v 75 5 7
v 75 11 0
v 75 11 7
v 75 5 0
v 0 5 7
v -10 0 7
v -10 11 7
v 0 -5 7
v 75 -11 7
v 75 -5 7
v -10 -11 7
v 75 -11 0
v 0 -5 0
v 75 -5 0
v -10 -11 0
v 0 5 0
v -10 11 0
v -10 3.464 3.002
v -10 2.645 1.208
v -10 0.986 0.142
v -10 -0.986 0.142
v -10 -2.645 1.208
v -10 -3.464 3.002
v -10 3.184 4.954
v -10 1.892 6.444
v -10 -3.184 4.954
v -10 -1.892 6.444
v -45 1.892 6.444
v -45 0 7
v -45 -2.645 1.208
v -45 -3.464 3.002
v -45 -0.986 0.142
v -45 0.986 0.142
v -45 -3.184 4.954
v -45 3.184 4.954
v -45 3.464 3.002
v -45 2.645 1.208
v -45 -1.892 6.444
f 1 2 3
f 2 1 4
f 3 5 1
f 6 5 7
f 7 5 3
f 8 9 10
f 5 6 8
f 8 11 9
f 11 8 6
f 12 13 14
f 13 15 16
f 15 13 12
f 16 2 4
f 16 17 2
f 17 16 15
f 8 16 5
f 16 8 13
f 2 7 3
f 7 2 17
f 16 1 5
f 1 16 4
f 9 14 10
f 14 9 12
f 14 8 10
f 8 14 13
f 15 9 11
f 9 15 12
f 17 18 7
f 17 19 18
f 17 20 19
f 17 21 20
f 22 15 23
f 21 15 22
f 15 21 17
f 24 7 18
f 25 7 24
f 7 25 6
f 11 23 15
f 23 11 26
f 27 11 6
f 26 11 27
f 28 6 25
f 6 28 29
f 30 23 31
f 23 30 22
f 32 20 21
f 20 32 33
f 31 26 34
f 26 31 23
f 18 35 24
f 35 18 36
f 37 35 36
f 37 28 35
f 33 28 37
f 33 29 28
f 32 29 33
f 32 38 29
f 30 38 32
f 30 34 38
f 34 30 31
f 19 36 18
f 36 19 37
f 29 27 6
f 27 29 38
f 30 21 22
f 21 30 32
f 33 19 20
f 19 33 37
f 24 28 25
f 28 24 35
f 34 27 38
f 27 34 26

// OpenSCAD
include <MCAD/units.scad>

PLA=0;
ABS=1;
ALU=2;
STEEL_A216=3;

properties=[ // E, rho in SI units
    [3.5E9, 1.3e3],
    [2.0E9, 1.1e3],
    [68E9, 2.790e3],
    [190E9, 7.8e3]
];

RECT=1;   // [+/-1, [b,h], pos]
CIRCLE=2; // [+/-2, dia, pos]

function area_1(area) =
    let(type = abs(area[0]))
    let(size = area[1])
    type == RECT ? size[0]*size[1] :
    type == CIRCLE ? PI*pow((size/2),2) :
    undef;

function I_1(area) =
    let(type = abs(area[0]))
    let(sig = type > 0 ? 1 : -1)
    let(size = area[1])
    type == RECT ? [size[0]*pow(size[1],3)/12, pow(size[0],3)*size[1]/12] :
    type == CIRCLE ? [PI/4*pow(size/2,4), PI/4*pow(size/2,4)] :
    undef;

function centroid(areas, i=0, sp=[0,0], sA=0) =
    i >= len(areas) ? sp/sA :
    let(area = areas[i])
    let(pos = area[2])
    let(A = area_1(area))
    centroid(areas, i+1, sp+A*pos, sA+A);

function I(areas, i=0, I_=[0,0], C_) =
    i >= len(areas) ? I_ :
    let(C = i==0 ? centroid(areas) : C_)
    let(area = areas[i])
    let(type = abs(area[0]))
    let(sig = area[0]>0 ? 1 : -1)
    let(size = area[1])
    let(A = area_1(area))
    let(pos = area[2] - C) // centroid-relative
    let(Ioffs = [A*pos[1]*pos[1], A*pos[0]*pos[0]])
    I(areas, i+1, I_ + sig*(I_1([area[0], size]) + Ioffs), C);

function area(areas, i=0, area_=0) =
    let(sig = areas[i][0] > 0 ? 1 : -1)
    i >= len(areas) ? area_ :
    area(areas, i+1, area_ + sig*area_1(areas[i]));

function fork_freq(l, Ix, A, E, rho) =
    pow(1.875,2)/(2*PI*pow(l,2))*sqrt(E*Ix/(rho*A));

function fork_freq_mat(l, Ix, A, mat=PLA) =
    let(props = properties[mat])
    fork_freq(l, Ix, A, props[0], props[1]);

// ----------------------------

f_C4_set = 261.6; // Hz

l_C4 = 0.075;
C4 = [[RECT, [0.007, 0.006], [0,0]]];

I_C4 = I(C4);
A_C4 = area(C4);
f_C4 = fork_freq_mat(l_C4, I_C4[0], A_C4, PLA);

echo(A=A_C4);
echo(C=centroid(C4));
echo(I=I_C4);
echo(f=f_C4);
// the fork is sharp - flattening is done by slimming
// down the tines

// Test for a steel fork of known dimensions
in = 0.0254;
f_C5_set = 523.3;
l_C5 = 3.3*in;
C5 = [[RECT, [0.17*in, 0.18*in], [0,0]]];
I_C5 = I(C5);
A_C5 = area(C5);
f_C5 = fork_freq_mat(l_C5, I_C5[0], A_C5, STEEL_A216);
assert(abs(f_C5 - f_C5_set)<10);

// ----------------------------

space = 10*mm;
l = l_C4*1000;
xs = C4[0][1]*1000;

translate([0, space/2, 0]) cube([l, xs[1], xs[0]]);
translate([0, -space/2-xs[1], 0]) cube([l, xs[1], xs[0]]);
translate([-5, 0, xs[0]/2]) cube([10,space+2*xs[1],xs[0]], center=true);
translate([-5, 0, xs[0]/2]) rotate([0,-90,0]) cylinder(d=xs[0], h=40, $sn=5);
